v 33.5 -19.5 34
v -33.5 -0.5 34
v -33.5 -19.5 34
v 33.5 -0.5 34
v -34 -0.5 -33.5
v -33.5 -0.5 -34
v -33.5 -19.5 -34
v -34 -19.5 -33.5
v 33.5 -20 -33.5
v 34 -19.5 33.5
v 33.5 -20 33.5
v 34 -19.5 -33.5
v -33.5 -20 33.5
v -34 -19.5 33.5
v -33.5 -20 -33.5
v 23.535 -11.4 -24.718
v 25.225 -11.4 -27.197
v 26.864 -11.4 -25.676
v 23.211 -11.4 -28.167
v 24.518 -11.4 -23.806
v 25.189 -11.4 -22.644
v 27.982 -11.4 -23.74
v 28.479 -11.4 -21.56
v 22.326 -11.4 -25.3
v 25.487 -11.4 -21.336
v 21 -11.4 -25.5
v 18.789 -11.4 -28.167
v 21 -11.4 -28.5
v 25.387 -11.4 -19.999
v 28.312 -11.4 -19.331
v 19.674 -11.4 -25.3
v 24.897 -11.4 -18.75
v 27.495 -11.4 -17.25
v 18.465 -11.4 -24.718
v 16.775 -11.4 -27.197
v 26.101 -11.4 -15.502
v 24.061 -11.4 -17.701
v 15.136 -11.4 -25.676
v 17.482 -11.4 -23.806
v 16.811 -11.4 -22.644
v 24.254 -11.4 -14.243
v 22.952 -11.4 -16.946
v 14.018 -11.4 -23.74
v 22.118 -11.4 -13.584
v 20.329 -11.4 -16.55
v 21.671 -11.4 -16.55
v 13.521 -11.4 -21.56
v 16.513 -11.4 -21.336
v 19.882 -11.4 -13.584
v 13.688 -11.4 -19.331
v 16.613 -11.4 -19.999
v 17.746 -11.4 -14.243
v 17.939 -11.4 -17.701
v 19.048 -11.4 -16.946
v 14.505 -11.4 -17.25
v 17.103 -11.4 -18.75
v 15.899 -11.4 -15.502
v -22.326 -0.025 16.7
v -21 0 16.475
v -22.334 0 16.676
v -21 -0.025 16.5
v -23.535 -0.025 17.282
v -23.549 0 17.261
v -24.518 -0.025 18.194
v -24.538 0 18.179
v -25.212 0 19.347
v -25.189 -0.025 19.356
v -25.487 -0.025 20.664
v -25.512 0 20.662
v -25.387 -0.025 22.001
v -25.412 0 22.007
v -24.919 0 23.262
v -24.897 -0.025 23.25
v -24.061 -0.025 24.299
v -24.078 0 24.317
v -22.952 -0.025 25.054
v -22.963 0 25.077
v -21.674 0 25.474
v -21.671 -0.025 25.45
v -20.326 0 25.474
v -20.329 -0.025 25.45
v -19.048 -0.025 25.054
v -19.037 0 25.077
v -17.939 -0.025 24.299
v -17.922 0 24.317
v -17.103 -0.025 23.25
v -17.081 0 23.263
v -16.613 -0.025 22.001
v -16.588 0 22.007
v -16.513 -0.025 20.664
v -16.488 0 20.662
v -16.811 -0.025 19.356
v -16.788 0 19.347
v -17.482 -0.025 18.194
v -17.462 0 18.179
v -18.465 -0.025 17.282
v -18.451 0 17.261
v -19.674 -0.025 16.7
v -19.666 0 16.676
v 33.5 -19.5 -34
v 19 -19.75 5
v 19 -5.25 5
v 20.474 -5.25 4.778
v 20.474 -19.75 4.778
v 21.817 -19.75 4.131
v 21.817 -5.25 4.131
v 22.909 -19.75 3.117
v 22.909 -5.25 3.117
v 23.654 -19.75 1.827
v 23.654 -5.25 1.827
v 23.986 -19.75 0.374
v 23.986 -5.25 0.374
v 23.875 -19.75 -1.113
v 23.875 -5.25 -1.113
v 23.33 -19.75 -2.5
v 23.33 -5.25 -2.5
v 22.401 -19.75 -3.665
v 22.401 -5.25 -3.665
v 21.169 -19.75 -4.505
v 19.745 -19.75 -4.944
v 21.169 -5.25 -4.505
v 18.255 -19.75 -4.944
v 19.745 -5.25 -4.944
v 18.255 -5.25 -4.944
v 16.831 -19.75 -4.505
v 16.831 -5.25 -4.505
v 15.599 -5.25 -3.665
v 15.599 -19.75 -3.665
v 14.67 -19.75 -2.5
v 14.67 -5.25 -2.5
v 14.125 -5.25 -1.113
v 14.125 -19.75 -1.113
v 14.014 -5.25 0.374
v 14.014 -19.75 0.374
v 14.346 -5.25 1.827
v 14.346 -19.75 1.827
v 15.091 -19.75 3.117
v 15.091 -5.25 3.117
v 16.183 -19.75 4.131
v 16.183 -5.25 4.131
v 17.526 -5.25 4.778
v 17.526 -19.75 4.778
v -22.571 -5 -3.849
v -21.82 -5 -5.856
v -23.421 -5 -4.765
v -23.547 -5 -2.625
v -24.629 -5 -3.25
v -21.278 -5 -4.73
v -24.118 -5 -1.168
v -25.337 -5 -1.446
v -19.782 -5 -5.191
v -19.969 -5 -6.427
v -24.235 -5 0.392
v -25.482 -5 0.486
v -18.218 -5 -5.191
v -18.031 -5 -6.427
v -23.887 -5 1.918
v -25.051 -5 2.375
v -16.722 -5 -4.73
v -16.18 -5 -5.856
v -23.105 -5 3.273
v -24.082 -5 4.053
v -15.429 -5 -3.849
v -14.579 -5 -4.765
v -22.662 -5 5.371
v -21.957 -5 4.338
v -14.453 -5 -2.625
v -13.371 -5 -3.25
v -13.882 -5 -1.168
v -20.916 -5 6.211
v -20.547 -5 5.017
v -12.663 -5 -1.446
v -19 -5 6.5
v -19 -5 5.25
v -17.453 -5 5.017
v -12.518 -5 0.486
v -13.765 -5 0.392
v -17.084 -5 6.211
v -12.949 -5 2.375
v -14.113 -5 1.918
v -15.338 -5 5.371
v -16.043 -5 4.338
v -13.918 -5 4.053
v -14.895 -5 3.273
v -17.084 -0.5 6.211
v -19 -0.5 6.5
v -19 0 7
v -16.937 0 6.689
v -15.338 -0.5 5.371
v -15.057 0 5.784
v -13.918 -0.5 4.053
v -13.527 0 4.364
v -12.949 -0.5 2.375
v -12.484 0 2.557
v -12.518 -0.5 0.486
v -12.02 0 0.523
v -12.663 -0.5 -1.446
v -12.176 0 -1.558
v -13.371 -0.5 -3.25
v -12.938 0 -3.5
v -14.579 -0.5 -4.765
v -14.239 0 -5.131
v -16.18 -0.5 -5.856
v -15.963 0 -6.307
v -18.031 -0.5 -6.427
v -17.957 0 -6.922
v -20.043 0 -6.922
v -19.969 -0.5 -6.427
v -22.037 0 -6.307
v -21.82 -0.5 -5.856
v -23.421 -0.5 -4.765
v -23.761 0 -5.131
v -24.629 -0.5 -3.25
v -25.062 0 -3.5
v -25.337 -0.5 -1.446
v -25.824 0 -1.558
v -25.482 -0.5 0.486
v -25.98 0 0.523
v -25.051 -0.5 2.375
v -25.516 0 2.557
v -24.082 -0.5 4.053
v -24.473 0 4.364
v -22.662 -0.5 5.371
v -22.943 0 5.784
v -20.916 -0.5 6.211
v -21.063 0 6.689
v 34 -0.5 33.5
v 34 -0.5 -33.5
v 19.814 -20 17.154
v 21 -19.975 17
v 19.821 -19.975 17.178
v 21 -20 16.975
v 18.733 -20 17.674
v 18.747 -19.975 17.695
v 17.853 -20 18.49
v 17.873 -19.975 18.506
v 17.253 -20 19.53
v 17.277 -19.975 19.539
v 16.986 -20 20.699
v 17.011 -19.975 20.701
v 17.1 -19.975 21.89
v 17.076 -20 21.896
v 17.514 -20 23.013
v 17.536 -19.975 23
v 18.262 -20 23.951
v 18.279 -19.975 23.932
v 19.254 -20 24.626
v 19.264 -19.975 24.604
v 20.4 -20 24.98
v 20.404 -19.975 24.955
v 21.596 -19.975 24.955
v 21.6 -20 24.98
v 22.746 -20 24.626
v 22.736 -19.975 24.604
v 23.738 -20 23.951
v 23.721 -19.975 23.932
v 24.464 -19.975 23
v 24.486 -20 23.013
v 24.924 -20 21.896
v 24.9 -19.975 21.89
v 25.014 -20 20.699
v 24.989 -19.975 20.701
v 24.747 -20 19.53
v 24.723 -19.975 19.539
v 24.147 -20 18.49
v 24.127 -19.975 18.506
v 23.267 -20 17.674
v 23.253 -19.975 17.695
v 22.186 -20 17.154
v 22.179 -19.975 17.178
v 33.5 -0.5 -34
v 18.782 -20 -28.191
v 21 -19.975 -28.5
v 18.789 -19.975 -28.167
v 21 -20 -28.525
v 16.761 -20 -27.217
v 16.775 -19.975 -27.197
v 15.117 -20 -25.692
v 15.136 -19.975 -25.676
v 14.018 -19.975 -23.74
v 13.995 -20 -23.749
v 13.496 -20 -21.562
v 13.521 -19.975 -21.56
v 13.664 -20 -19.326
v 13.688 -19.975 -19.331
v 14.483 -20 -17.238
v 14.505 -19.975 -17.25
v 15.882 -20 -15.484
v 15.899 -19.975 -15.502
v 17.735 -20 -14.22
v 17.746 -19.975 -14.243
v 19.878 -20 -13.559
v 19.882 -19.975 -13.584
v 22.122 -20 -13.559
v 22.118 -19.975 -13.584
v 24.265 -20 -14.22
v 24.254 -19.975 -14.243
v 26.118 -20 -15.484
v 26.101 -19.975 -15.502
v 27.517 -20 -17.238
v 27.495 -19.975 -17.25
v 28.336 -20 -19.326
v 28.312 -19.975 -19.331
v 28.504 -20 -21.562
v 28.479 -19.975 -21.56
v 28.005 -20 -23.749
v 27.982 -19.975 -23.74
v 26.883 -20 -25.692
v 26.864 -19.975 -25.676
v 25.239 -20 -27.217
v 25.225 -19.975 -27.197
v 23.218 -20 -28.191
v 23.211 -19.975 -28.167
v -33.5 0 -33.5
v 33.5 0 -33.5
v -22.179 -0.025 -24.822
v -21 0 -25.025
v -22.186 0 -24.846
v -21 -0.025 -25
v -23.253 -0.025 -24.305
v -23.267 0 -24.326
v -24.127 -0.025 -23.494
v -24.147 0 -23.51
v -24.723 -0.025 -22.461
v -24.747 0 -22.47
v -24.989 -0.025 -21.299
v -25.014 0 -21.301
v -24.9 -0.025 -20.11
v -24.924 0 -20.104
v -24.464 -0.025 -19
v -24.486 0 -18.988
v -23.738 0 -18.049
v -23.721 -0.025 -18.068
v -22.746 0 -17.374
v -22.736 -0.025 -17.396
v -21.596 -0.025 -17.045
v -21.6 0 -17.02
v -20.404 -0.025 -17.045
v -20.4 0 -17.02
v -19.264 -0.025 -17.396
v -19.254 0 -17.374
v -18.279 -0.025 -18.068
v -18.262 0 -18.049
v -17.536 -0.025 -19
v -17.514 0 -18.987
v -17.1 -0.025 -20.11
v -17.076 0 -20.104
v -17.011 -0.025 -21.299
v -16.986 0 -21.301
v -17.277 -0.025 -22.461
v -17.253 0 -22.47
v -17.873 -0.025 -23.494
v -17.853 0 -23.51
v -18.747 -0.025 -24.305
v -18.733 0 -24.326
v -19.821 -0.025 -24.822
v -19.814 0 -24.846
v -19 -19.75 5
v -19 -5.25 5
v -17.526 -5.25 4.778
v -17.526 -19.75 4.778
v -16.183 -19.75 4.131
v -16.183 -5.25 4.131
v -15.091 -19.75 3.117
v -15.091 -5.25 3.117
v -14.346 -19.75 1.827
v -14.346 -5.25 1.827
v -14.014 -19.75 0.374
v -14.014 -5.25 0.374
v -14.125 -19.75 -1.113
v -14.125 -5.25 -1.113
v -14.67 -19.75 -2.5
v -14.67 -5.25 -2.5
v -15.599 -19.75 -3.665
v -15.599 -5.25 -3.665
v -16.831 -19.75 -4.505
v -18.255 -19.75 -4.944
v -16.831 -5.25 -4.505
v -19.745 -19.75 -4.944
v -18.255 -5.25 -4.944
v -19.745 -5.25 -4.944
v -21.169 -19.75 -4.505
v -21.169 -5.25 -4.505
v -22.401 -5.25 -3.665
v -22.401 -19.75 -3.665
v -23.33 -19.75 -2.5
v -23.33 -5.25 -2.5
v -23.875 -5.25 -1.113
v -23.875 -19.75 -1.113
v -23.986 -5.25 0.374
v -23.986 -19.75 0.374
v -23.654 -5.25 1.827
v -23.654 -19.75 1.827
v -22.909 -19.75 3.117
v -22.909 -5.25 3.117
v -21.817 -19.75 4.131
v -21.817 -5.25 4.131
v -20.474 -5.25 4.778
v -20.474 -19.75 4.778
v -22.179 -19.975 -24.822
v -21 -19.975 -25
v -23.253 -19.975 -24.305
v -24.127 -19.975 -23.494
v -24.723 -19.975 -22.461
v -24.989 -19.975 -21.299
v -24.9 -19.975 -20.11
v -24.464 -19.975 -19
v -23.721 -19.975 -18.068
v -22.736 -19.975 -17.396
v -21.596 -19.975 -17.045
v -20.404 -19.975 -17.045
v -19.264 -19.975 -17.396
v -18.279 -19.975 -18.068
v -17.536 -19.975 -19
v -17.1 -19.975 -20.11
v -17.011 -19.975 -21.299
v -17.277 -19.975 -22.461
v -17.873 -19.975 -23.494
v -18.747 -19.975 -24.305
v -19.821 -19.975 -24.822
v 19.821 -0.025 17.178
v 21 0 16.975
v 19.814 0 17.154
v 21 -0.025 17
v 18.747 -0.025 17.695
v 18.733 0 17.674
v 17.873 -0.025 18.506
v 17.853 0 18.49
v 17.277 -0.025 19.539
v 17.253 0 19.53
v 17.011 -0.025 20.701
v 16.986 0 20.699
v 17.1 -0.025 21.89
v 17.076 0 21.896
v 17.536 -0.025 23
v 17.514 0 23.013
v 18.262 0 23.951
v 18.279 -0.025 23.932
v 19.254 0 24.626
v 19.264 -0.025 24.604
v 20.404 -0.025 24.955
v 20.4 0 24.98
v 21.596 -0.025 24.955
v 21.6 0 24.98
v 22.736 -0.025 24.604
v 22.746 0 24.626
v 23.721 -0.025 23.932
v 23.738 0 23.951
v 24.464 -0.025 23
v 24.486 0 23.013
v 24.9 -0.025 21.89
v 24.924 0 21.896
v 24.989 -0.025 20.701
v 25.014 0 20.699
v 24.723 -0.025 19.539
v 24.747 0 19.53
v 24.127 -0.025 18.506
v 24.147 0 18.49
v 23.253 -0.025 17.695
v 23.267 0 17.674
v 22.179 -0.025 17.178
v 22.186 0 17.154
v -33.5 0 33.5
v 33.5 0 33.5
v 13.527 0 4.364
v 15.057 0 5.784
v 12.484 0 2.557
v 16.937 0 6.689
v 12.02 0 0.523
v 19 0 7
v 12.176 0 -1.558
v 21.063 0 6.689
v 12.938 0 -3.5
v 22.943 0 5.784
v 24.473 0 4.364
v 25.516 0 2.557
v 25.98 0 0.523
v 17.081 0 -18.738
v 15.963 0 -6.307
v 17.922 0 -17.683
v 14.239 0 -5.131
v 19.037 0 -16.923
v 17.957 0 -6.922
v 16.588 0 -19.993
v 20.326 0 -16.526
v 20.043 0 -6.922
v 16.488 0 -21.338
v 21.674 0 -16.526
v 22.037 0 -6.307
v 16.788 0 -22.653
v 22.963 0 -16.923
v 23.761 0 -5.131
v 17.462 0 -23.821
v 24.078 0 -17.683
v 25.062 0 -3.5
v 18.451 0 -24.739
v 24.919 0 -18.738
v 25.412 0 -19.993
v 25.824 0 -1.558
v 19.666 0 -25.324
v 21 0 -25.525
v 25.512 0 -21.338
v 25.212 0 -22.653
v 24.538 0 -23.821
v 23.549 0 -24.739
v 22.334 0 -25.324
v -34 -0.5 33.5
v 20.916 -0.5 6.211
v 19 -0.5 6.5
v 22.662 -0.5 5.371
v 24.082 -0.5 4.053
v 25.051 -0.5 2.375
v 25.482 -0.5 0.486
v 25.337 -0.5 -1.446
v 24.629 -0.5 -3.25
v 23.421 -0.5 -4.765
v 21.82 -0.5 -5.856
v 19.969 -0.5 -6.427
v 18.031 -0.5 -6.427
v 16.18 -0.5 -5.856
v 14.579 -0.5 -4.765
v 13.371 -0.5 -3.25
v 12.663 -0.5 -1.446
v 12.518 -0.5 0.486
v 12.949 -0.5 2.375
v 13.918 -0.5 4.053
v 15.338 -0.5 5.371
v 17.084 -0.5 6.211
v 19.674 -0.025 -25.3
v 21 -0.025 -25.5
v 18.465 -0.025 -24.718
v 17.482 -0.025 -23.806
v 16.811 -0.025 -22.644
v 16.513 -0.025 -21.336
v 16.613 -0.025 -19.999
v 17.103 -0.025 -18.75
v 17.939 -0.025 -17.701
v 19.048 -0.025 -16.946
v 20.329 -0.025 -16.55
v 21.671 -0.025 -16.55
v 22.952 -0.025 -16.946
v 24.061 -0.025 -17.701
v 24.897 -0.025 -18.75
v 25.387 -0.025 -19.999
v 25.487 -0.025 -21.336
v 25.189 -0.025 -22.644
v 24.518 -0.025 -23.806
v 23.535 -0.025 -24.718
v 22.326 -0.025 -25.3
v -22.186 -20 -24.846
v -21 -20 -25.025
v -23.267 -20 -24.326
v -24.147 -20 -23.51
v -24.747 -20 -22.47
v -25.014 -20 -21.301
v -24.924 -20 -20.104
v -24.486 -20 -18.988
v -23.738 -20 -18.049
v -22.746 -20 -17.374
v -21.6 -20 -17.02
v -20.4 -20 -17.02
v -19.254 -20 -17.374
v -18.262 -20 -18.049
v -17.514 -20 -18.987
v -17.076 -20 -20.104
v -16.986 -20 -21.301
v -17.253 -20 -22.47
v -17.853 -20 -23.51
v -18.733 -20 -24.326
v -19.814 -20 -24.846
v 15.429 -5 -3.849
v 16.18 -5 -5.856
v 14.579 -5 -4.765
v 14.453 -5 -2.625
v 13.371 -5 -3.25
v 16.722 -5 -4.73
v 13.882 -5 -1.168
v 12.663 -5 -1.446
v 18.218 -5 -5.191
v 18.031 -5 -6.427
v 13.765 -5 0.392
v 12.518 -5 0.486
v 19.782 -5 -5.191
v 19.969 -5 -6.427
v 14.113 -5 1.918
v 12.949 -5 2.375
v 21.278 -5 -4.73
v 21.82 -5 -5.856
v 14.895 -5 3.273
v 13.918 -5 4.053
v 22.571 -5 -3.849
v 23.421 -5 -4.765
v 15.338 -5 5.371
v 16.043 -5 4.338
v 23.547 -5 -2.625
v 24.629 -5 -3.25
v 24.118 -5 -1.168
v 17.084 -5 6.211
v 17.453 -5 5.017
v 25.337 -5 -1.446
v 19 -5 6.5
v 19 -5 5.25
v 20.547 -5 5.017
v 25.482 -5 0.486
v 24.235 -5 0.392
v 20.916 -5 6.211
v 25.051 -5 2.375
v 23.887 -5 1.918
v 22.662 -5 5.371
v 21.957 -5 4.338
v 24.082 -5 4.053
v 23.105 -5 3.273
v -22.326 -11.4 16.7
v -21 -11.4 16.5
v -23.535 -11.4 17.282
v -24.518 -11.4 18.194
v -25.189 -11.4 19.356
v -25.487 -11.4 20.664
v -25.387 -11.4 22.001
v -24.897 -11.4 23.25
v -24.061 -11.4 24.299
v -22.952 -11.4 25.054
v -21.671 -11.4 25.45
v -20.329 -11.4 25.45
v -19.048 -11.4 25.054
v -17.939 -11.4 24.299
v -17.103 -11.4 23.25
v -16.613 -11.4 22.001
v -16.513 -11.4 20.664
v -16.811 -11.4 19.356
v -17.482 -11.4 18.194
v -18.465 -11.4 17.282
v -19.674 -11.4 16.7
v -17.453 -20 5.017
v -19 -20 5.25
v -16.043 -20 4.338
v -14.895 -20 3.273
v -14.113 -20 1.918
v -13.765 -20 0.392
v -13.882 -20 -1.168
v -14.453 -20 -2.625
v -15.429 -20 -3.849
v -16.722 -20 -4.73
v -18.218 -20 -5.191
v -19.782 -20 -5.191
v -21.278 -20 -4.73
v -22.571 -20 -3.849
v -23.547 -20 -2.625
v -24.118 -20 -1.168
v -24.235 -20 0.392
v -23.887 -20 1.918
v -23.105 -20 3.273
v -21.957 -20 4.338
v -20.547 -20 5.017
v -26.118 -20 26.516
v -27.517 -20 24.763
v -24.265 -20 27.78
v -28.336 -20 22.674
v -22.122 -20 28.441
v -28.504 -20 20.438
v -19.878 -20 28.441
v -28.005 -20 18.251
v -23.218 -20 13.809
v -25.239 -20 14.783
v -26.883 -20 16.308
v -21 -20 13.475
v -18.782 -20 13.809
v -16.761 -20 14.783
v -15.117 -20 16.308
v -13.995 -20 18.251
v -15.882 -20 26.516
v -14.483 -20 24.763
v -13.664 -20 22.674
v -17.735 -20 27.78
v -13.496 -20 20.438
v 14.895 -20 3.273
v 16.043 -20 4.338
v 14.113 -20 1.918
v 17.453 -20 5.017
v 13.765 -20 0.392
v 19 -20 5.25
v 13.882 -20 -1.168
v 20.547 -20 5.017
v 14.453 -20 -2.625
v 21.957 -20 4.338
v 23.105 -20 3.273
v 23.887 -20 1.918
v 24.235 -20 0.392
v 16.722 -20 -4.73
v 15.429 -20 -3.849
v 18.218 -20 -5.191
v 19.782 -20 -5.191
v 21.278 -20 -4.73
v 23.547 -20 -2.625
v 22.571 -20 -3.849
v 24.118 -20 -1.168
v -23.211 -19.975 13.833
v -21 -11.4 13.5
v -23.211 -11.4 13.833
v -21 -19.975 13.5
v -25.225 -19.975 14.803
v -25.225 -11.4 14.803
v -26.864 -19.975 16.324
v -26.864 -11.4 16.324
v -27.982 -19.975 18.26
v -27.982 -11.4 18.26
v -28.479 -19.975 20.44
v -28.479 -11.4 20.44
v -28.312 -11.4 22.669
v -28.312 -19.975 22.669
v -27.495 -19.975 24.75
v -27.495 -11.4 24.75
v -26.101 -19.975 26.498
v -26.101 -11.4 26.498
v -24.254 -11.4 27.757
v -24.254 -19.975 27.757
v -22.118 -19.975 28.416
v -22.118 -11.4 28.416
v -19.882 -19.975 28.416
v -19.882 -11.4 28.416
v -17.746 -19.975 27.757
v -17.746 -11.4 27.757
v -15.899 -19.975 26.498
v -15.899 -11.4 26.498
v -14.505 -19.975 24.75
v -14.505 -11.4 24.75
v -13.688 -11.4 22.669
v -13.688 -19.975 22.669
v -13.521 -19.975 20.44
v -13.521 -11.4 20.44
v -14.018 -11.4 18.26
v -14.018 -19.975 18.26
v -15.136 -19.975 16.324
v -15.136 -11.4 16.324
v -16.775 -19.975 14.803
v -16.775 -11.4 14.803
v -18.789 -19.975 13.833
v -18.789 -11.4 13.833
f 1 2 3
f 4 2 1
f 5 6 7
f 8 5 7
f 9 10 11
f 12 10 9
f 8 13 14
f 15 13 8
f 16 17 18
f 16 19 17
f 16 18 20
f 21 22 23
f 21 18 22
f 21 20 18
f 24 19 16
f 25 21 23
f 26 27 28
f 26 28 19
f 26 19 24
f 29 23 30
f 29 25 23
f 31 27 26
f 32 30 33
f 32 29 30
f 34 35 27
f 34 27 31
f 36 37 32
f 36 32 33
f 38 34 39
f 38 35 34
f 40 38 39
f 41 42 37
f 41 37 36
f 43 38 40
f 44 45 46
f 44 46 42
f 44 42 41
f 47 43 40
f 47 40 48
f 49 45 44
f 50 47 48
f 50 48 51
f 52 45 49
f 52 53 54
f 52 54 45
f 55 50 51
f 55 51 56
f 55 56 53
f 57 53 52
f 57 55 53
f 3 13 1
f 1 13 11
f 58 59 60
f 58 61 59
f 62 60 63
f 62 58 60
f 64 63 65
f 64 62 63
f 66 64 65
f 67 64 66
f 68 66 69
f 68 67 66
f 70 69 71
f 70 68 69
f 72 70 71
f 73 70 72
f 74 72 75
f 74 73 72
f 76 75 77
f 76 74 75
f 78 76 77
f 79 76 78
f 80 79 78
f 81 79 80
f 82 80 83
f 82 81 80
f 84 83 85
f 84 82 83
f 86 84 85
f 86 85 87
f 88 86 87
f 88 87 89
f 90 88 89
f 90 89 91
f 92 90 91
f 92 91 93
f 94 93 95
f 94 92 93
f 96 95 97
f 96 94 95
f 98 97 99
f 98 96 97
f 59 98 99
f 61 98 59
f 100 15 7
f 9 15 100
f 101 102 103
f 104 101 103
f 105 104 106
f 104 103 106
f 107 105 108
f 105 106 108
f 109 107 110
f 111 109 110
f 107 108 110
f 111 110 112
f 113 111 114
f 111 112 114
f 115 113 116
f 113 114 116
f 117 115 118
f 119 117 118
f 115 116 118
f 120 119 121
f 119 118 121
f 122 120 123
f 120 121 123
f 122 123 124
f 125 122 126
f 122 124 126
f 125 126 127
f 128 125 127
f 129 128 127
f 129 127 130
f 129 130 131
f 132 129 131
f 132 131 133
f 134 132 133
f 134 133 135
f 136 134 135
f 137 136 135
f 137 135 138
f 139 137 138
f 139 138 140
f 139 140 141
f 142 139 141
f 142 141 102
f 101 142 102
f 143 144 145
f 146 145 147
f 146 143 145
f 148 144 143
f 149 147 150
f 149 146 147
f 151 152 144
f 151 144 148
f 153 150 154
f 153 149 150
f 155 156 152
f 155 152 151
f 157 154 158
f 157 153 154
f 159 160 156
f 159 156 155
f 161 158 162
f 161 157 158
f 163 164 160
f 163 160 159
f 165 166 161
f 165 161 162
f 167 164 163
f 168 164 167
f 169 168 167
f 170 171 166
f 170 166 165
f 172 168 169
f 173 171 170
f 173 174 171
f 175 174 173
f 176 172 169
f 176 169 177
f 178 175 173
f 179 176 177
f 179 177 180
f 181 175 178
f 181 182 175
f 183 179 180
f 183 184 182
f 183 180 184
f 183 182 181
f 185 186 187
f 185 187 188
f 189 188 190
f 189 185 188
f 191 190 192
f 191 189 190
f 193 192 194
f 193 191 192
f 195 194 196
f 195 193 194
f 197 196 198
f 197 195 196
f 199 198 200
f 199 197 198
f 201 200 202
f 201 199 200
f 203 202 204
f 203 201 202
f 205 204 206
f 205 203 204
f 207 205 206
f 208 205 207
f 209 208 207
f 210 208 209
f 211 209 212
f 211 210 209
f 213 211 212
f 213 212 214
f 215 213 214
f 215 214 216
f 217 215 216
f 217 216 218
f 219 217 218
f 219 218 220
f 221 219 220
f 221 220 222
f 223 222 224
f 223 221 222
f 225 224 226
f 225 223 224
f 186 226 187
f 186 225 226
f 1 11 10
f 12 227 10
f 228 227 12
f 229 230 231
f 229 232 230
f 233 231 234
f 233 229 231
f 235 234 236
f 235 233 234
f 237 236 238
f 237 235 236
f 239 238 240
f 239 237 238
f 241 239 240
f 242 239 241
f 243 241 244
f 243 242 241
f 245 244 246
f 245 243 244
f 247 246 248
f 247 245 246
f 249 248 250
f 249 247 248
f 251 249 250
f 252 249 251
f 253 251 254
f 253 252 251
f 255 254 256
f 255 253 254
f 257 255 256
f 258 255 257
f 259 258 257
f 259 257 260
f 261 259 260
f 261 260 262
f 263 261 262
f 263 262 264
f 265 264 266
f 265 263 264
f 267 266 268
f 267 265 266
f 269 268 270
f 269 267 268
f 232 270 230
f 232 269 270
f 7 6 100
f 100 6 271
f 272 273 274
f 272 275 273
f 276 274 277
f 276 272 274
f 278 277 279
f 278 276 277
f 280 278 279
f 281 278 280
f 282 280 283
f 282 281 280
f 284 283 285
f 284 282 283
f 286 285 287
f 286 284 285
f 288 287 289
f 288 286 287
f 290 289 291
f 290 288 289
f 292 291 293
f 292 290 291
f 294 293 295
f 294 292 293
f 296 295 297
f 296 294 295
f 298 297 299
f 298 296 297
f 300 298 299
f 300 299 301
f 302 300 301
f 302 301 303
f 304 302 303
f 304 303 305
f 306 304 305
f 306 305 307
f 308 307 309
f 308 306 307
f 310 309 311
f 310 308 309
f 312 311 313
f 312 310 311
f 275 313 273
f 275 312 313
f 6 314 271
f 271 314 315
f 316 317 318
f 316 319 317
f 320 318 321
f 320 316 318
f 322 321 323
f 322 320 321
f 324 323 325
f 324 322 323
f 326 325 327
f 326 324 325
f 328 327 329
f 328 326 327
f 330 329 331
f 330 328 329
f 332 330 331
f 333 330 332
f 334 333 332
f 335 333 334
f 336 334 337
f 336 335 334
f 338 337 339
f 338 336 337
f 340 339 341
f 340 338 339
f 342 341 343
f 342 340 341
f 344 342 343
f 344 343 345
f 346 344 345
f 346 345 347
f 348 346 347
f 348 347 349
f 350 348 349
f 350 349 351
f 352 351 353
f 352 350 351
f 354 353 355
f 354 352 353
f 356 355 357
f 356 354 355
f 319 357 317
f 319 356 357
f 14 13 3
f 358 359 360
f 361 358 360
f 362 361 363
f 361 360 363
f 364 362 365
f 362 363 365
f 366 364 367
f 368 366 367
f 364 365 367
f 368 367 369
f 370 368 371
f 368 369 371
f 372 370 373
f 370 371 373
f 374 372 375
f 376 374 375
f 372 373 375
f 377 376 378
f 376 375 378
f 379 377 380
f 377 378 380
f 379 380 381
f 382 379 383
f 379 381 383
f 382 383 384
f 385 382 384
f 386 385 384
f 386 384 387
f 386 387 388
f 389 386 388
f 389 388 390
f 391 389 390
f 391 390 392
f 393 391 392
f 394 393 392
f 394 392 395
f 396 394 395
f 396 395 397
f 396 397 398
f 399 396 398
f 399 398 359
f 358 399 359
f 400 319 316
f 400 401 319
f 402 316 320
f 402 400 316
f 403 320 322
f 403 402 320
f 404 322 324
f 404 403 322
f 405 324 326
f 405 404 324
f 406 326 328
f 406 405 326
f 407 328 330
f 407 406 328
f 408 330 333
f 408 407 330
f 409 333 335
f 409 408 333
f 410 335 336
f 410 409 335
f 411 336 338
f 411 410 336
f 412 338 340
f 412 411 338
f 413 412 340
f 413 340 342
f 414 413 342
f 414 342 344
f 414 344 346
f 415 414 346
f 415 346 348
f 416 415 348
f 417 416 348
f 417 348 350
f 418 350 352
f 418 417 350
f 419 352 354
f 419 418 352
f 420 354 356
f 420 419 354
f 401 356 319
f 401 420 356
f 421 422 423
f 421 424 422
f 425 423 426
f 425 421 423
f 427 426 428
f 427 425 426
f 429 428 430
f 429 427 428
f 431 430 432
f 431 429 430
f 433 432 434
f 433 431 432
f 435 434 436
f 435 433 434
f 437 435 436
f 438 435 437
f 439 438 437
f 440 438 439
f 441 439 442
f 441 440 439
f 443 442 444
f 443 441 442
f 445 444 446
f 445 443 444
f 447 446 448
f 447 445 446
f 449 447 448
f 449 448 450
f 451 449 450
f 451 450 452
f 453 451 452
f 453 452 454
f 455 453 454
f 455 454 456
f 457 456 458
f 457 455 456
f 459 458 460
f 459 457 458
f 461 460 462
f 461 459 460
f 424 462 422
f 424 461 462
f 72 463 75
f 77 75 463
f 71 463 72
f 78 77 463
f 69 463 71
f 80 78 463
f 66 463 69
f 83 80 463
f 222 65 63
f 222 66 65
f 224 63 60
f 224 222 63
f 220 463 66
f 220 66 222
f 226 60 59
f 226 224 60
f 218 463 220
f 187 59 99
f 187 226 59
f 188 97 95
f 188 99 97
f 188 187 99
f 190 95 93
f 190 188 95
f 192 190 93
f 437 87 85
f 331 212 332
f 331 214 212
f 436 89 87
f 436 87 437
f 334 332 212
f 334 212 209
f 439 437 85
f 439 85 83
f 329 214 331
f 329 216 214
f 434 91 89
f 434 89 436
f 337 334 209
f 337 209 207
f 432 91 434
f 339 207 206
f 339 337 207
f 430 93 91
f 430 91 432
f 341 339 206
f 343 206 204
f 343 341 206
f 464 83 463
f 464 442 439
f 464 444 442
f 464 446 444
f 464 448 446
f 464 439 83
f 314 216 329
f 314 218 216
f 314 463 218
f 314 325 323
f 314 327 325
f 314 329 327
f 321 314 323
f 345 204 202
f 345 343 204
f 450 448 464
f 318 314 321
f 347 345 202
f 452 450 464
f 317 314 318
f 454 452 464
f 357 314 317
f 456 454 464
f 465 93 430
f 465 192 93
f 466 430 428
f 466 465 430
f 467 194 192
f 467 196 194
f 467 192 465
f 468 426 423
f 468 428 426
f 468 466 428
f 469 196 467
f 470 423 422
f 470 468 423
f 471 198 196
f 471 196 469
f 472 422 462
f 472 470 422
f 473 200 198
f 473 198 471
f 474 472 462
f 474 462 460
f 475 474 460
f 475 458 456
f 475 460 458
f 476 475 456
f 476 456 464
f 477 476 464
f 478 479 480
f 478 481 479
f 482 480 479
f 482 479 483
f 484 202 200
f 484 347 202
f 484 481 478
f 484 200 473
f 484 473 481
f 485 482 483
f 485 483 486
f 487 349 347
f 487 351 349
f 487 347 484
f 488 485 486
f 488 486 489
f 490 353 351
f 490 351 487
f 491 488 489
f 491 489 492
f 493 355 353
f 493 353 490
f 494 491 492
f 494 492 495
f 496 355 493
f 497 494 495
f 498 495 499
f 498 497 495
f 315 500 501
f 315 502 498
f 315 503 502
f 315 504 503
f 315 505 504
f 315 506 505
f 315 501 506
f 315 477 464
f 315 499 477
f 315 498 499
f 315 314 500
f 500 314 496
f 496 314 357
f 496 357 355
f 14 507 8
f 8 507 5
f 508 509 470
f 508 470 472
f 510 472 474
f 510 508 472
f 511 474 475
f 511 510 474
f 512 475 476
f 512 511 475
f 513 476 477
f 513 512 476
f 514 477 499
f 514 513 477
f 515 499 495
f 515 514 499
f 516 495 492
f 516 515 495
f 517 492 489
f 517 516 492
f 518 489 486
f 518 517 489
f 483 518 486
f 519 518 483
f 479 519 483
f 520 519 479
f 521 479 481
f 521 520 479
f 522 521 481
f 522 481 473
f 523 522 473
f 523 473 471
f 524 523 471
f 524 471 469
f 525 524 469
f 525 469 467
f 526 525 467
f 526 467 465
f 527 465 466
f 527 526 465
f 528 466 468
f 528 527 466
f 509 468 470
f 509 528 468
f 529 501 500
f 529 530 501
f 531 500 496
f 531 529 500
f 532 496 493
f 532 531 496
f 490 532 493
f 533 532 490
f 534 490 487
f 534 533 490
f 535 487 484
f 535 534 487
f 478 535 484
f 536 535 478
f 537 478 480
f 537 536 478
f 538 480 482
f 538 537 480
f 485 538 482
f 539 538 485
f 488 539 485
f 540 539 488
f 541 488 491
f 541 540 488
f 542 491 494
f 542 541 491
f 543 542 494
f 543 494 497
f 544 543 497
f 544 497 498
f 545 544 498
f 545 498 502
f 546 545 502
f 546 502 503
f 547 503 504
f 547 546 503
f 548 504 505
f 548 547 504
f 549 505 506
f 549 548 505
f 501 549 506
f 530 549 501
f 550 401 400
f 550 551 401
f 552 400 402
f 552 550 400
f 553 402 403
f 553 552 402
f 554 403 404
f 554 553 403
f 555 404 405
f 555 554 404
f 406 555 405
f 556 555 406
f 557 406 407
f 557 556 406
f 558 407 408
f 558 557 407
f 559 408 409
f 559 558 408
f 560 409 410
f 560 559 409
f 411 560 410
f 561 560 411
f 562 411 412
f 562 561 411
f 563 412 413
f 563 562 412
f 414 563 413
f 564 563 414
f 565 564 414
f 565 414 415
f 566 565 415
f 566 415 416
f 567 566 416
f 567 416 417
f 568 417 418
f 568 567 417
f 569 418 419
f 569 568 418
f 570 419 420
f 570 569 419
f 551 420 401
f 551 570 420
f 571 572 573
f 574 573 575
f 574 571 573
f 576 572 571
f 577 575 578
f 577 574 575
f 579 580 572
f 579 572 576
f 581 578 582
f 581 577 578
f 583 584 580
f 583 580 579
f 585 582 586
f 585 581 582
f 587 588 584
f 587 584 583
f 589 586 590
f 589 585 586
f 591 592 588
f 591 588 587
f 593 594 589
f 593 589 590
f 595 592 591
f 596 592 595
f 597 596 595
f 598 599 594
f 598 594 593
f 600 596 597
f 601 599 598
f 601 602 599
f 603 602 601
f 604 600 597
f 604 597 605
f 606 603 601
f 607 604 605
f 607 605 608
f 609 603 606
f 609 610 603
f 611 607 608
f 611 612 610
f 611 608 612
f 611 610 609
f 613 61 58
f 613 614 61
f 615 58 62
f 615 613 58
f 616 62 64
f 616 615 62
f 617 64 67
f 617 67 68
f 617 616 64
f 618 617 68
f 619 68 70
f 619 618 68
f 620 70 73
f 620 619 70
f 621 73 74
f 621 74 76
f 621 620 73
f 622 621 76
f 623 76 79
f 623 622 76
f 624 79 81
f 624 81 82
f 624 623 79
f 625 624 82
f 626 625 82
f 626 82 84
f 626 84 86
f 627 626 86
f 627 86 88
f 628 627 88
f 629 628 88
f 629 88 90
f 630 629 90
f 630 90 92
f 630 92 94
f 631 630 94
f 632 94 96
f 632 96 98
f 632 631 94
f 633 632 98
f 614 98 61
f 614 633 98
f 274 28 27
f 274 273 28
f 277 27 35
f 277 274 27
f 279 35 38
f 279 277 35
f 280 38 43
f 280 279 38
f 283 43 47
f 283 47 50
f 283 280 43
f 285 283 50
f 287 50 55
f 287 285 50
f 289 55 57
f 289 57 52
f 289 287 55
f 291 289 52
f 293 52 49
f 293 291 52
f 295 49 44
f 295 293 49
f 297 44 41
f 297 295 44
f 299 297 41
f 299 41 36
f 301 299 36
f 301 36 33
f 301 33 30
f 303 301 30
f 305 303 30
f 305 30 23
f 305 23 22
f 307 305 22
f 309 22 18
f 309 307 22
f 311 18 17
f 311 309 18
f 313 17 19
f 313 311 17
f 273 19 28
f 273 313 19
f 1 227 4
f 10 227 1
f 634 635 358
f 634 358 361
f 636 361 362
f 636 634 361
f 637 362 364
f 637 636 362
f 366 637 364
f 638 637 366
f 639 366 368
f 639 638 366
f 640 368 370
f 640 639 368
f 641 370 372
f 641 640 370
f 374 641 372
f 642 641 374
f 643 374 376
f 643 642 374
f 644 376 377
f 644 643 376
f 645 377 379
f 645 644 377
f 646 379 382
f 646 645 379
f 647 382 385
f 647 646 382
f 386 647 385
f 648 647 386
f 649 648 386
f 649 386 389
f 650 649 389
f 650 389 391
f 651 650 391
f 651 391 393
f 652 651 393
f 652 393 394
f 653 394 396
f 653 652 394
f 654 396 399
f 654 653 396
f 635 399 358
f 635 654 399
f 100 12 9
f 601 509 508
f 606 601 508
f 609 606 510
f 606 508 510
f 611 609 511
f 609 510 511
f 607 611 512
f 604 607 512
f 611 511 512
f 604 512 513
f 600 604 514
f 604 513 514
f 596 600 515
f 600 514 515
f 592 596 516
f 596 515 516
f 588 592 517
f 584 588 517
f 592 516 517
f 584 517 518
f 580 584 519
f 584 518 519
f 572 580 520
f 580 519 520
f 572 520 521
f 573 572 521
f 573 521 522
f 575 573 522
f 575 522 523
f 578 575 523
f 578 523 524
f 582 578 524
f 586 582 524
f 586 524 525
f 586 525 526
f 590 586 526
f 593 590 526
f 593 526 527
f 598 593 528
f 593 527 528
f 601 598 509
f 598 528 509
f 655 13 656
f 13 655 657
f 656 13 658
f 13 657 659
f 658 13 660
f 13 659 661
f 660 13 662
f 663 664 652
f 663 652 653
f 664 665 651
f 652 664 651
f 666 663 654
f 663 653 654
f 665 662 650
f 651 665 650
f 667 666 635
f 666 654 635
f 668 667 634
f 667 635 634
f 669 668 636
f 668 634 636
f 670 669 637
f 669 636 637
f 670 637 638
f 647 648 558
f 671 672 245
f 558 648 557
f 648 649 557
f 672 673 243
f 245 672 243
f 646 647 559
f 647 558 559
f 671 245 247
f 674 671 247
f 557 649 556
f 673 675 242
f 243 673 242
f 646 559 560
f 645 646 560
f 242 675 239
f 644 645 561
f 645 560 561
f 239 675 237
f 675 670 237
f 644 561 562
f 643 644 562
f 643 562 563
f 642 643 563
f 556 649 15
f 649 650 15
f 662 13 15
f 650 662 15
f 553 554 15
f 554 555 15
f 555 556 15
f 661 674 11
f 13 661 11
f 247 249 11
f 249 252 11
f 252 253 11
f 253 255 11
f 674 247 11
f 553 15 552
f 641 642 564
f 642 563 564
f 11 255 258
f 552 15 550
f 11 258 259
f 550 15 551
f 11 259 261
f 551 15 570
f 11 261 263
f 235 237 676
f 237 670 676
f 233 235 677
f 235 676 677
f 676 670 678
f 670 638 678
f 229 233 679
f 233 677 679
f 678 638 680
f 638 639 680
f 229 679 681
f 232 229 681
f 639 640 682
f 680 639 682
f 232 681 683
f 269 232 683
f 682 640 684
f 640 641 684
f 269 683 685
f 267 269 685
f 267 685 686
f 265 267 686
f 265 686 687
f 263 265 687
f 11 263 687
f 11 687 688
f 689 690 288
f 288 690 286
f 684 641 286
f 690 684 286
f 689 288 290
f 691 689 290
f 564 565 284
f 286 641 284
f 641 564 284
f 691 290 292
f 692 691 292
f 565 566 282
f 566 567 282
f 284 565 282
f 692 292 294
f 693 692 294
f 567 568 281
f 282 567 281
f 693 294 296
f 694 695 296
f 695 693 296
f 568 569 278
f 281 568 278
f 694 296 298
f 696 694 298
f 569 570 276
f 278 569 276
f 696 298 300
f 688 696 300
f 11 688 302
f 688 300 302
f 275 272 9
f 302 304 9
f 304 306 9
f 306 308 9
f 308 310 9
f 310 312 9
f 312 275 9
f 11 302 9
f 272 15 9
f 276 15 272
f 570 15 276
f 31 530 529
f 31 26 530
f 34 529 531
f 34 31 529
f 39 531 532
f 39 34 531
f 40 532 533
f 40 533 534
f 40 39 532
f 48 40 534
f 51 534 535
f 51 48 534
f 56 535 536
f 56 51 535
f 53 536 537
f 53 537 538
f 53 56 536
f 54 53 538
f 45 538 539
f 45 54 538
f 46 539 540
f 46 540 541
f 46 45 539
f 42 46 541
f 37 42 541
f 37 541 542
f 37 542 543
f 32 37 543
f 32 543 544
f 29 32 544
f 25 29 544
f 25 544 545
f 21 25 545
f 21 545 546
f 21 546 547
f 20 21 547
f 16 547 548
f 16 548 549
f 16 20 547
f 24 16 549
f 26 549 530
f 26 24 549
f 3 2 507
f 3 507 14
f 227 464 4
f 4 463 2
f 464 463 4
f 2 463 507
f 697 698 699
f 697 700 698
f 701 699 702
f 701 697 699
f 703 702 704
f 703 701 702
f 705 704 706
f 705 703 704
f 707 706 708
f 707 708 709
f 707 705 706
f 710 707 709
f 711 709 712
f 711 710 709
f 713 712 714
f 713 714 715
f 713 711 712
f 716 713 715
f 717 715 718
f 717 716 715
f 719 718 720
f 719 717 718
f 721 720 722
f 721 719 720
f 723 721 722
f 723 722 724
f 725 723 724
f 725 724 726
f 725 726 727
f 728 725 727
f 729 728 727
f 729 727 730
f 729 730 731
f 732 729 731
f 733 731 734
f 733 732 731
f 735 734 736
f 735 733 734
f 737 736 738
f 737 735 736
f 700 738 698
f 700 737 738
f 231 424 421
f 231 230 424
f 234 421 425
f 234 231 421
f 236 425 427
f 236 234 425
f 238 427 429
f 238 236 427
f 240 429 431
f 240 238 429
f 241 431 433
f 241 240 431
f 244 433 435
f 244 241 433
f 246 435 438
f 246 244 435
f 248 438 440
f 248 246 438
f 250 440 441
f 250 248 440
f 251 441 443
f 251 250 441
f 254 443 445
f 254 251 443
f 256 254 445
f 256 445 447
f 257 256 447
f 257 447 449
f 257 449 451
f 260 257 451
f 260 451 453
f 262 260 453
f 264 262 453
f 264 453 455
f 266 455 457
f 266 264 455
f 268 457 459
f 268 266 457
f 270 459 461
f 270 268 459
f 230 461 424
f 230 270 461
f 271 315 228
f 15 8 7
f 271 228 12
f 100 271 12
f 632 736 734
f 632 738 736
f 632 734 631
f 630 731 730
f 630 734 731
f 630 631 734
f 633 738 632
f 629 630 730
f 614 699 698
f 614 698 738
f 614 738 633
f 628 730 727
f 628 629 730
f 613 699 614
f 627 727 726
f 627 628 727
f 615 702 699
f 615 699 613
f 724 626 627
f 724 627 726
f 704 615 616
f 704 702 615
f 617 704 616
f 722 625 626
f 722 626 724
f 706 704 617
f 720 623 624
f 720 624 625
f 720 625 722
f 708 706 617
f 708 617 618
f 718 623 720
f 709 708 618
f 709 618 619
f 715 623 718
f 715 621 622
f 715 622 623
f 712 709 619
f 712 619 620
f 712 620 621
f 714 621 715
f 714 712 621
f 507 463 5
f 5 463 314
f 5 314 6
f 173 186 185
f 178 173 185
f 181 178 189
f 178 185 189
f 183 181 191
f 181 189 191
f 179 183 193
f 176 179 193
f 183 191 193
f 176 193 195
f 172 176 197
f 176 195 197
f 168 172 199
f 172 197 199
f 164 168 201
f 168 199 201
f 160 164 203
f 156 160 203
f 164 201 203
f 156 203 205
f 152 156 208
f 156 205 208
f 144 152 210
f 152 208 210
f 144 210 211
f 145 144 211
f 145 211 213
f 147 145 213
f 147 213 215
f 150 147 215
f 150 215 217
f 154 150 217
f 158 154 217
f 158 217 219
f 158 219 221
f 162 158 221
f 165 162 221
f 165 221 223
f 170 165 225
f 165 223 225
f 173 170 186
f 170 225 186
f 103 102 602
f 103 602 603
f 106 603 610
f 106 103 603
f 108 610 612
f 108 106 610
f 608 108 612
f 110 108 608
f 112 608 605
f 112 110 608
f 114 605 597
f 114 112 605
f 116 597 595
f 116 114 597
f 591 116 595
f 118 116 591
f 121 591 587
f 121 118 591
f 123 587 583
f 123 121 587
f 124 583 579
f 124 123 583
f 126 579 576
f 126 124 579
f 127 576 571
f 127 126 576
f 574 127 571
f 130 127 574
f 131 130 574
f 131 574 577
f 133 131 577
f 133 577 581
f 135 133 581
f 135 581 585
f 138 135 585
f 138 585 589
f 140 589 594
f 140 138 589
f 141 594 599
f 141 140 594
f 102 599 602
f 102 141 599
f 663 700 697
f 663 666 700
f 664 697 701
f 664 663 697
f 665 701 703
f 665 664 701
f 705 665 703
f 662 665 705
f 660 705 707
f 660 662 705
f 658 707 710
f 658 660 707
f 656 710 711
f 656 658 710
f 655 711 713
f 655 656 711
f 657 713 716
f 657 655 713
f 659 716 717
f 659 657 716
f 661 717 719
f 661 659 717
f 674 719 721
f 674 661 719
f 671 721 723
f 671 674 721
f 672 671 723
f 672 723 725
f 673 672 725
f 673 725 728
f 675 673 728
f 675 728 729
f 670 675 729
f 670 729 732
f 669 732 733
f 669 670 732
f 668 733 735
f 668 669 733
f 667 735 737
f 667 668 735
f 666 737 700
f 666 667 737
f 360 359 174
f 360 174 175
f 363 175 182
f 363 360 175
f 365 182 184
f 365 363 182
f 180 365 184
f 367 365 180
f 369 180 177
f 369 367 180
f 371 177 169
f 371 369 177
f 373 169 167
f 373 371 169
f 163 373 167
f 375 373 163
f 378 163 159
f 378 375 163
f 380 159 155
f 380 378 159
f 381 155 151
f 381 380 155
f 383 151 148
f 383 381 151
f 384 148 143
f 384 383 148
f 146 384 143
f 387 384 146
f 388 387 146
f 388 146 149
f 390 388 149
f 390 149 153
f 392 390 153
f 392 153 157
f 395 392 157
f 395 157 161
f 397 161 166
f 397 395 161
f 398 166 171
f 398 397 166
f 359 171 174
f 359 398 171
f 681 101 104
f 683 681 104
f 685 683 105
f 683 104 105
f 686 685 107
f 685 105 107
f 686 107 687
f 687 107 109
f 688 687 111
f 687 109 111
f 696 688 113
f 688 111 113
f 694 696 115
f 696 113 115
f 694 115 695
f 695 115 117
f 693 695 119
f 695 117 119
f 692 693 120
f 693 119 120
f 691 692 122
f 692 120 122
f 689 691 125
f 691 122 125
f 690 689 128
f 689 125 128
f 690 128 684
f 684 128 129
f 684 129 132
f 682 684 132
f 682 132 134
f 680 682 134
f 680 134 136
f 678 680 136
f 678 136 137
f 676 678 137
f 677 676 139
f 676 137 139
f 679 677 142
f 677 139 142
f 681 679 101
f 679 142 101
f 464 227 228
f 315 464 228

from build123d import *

# Parameters (mm, degrees)
SKETCH1_W                                    = 68
SKETCH1_H                                    = 68
BOSS_EXTRUDE1_DEPTH                          = 20
CUT_EXTRUDE1_REACH                           = 54.077
SKETCH2_R                                    = 5
SKETCH3_R                                    = 6.5
CUT_EXTRUDE2_DEPTH                           = 5
CHAMFER2_SIZE                                = 0.5
CHAMFER4_SIZE                                = 0.5
CHAMFER5_SIZE                                = 0.25
CBORE_FOR_M8_HEX_SOCKET_HEAD_CAP_SCR_2_COUNT = 2
CBORE_FOR_M8_HEX_SOCKET_HEAD_CAP_SCR_2_PITCH = 59.39696962
F_8_0MM_DOWEL_HOLE1_AT_2_COUNT               = 2
F_8_0MM_DOWEL_HOLE1_AT_2_PITCH               = 59.39696962


with BuildPart() as part:
    # Sketch1 → Boss-Extrude1 (new body)
    with BuildSketch(Plane(origin=(0, 0, 0), x_dir=(1, 0, 0), z_dir=(0, 1, 0))):
        Rectangle(SKETCH1_W, SKETCH1_H)
    extrude(amount=-BOSS_EXTRUDE1_DEPTH)

    # Sketch2 → Cut-Extrude1 (cut, up to next)
    with BuildSketch(Plane(origin=(0, 0, 0), x_dir=(1, 0, 0), z_dir=(0, 1, 0)), mode=Mode.PRIVATE) as cut_extrude1_sk1:
        with Locations(Location((-19, 0, 0), (0, 0, 270))):
            Circle(SKETCH2_R)
    cut_extrude1_tool1 = extrude(cut_extrude1_sk1.sketch, amount=-CUT_EXTRUDE1_REACH, mode=Mode.PRIVATE) & part.part
    # Sketch2 → Cut-Extrude1 (cut, up to next)
    with BuildSketch(Plane(origin=(0, 0, 0), x_dir=(1, 0, 0), z_dir=(0, 1, 0)), mode=Mode.PRIVATE) as cut_extrude1_sk2:
        with Locations(Location((19, 0, 0), (0, 0, 270))):
            Circle(SKETCH2_R)
    cut_extrude1_tool2 = extrude(cut_extrude1_sk2.sketch, amount=-CUT_EXTRUDE1_REACH, mode=Mode.PRIVATE) & part.part
    add(cut_extrude1_tool1.solids().sort_by_distance((-19, 0, 0))[0], mode=Mode.SUBTRACT)
    add(cut_extrude1_tool2.solids().sort_by_distance((19, 0, 0))[0], mode=Mode.SUBTRACT)

    # Sketch3 → Cut-Extrude2 (cut)
    with BuildSketch(Plane(origin=(0, 0, 0), x_dir=(1, 0, 0), z_dir=(0, 1, 0))):
        with Locations(Location((-19, 0, 0), (0, 0, 270))):
            Circle(SKETCH3_R)
        with Locations(Location((19, 0, 0), (0, 0, 270))):
            Circle(SKETCH3_R)
    extrude(amount=-CUT_EXTRUDE2_DEPTH, mode=Mode.SUBTRACT)

    # Chamfer2
    chamfer2_edges = [part.edges().sort_by_distance(p)[0] for p in [
        (-34, -20, 0),
        (0, -20, 34),
        (34, -20, 0),
        (0, 0, 34),
        (-34, 0, 0),
        (0, 0, -34),
        (34, 0, 0),
        (34, -10, 34),
        (-34, -10, 34),
        (-34, -10, -34),
        (34, -10, -34),
        (0, -20, -34),
    ]]
    chamfer(chamfer2_edges, length=CHAMFER2_SIZE)

    # Chamfer4
    chamfer4_edges = [part.edges().sort_by_distance(p)[0] for p in [
        (-19, 0, -6.5),
        (19, 0, -6.5),
    ]]
    chamfer(chamfer4_edges, length=CHAMFER4_SIZE)

    # Chamfer5
    chamfer5_edges = [part.edges().sort_by_distance(p)[0] for p in [
        (-19, -20, -5),
        (19, -20, -5),
        (-19, -5, -5),
        (19, -5, -5),
    ]]
    chamfer(chamfer5_edges, length=CHAMFER5_SIZE)

    # Sketch5 → CBORE for M8 Hex Socket Head Cap Screw1 (revolve, cut)
    with BuildSketch(Plane(origin=(-21, -20, 21), x_dir=(0, 0, -1), z_dir=(1, 0, 0))):
        Polygon((0, 0), (0, 20), (4.525, 20), (4.5, 19.975), (4.5, 8.6), (7.5, 8.6), (7.5, 0.025), (7.525, 0), align=None)
    cbore_for_m8_hex_socket_head_cap_screw1 = revolve(axis=Axis((-21, -26.35, 21), (0, 1, 0)), mode=Mode.SUBTRACT)

    # CBORE for M8 Hex Socket Head Cap Scr 2: CBORE for M8 Hex Socket Head Cap Screw1 ×2
    with Locations(*[Vector(0.7071067811865476, 0, -0.7071067811865476) * (i * CBORE_FOR_M8_HEX_SOCKET_HEAD_CAP_SCR_2_PITCH) for i in range(1, CBORE_FOR_M8_HEX_SOCKET_HEAD_CAP_SCR_2_COUNT)]):
        add(cbore_for_m8_hex_socket_head_cap_screw1, mode=Mode.SUBTRACT)

    # Sketch7 → Ø8.0mm Dowel Hole1 (revolve, cut)
    with BuildSketch(Plane(origin=(-21, -20, -21), x_dir=(0, 0, -1), z_dir=(1, 0, 0))):
        Polygon((0, 0), (0, 20), (4.025, 20), (4, 19.975), (4, 0.025), (4.025, 0), align=None)
    f_8_0mm_dowel_hole1 = revolve(axis=Axis((-21, -26.35, -21), (0, 1, 0)), mode=Mode.SUBTRACT)

    # Ø8.0mm Dowel Hole1 at 2: Ø8.0mm Dowel Hole1 ×2
    with Locations(*[Vector(0.7071067811865476, 0, 0.7071067811865476) * (i * F_8_0MM_DOWEL_HOLE1_AT_2_PITCH) for i in range(1, F_8_0MM_DOWEL_HOLE1_AT_2_COUNT)]):
        add(f_8_0mm_dowel_hole1, mode=Mode.SUBTRACT)


solid = part.part
